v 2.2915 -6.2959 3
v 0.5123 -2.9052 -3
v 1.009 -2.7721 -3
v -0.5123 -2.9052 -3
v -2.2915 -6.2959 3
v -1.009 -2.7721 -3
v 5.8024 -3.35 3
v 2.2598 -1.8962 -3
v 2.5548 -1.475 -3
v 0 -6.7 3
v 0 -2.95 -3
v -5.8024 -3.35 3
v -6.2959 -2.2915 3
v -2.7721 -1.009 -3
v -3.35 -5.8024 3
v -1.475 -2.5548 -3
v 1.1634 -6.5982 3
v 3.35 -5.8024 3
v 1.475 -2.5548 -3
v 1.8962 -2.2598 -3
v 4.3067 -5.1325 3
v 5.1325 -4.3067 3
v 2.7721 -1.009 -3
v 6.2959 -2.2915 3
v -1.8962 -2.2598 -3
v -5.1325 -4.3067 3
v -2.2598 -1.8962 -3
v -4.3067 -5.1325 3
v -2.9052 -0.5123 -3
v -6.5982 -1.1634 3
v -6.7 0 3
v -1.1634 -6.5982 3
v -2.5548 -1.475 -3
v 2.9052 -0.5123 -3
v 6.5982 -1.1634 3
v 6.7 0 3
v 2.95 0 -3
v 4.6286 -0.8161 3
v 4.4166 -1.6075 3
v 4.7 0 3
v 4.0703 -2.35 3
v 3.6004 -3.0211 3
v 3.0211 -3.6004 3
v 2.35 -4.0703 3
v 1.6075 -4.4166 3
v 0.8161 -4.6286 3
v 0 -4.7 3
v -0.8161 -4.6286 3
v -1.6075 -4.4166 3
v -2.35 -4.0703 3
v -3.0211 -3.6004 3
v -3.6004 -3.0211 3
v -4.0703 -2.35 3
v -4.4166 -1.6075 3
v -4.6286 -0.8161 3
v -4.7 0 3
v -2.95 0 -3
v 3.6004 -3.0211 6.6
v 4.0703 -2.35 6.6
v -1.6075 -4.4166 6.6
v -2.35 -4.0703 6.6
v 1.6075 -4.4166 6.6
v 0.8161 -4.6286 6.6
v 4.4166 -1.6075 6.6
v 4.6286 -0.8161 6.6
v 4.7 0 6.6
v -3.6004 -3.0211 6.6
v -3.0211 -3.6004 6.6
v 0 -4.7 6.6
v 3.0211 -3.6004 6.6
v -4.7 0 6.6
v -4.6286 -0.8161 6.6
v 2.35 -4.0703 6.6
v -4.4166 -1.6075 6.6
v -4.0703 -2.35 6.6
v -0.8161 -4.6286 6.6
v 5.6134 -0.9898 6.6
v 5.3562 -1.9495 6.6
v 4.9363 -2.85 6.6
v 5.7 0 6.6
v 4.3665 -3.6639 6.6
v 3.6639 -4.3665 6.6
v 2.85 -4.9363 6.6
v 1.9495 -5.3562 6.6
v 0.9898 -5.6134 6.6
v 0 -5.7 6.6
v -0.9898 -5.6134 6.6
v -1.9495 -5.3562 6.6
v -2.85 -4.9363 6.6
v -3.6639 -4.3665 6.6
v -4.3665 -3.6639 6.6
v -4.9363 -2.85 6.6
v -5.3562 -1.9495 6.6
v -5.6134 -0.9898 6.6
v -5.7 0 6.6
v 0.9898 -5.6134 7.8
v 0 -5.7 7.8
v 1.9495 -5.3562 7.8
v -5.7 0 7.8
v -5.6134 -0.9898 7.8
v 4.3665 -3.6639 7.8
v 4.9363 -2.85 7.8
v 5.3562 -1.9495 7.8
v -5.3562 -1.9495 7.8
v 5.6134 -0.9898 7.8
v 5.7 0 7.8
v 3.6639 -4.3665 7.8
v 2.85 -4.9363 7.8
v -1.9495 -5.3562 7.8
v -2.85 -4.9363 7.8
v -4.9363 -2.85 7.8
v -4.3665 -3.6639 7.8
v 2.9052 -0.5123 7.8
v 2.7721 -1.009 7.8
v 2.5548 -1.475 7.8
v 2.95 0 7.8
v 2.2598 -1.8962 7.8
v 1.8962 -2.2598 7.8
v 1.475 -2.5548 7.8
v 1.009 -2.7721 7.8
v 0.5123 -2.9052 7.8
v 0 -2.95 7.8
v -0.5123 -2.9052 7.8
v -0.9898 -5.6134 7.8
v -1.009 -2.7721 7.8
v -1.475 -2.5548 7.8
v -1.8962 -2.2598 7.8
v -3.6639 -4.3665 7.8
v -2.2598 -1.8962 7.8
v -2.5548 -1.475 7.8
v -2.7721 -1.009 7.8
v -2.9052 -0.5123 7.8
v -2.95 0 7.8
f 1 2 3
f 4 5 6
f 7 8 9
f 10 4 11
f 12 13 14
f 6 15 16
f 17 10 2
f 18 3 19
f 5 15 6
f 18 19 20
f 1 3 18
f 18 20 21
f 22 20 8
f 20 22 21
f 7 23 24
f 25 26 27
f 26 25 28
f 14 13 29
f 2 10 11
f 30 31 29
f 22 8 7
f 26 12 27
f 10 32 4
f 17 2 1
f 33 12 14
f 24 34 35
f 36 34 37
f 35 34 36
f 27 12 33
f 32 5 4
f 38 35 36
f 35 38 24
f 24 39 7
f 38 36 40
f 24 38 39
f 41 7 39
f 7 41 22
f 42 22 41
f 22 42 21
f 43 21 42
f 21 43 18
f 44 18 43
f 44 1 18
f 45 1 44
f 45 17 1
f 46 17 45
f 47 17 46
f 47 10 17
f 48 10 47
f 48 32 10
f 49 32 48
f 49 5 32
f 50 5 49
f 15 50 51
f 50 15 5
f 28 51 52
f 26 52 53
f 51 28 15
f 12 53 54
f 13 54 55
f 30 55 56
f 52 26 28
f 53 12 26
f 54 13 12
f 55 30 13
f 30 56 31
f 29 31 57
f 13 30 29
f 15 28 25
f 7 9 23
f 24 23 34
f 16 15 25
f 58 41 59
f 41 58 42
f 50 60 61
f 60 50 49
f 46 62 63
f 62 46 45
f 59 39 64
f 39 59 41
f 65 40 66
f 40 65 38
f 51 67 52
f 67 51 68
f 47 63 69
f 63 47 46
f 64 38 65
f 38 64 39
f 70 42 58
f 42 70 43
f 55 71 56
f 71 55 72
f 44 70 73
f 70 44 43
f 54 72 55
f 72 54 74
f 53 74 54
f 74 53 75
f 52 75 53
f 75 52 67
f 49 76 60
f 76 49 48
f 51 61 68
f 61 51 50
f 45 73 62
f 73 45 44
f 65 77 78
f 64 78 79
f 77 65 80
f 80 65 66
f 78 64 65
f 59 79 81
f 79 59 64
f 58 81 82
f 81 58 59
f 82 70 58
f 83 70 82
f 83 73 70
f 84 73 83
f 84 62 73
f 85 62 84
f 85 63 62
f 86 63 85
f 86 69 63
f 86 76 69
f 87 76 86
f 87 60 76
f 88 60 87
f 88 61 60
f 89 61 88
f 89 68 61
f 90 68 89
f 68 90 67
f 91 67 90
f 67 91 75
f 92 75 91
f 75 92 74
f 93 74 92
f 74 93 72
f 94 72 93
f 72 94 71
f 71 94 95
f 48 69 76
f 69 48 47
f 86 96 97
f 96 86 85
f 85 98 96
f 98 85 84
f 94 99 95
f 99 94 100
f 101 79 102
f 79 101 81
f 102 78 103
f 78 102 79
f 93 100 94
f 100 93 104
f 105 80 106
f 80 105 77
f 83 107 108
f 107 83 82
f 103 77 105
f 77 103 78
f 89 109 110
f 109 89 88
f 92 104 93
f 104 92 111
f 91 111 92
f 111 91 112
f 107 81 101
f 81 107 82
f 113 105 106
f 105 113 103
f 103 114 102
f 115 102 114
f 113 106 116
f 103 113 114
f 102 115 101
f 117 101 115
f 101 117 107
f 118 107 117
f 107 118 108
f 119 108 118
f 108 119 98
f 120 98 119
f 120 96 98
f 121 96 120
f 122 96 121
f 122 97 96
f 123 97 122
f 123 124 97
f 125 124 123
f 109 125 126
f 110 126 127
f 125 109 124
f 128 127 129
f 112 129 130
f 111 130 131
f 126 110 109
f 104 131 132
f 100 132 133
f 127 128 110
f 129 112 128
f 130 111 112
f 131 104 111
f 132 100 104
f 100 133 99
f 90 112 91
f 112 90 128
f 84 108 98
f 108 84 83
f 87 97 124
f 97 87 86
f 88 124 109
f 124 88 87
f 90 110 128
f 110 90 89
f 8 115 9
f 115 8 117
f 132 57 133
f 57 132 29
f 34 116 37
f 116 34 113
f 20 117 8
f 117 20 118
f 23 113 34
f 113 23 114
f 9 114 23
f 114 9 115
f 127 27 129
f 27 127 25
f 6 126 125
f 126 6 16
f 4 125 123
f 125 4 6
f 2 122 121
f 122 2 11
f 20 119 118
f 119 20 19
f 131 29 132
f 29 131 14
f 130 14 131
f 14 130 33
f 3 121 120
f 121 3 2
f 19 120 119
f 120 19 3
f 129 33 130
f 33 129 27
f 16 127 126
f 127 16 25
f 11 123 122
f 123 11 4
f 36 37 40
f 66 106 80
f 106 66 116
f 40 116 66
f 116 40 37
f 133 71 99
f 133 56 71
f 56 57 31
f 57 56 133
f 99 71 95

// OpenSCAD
$fn=36;
//$cable and $hood are radii
$cable=5.9/2;
$hood=9.4/2;
$hooddepth=3.6;


module plug()
{
	difference()
	{
		plugsolid();
		cylinder(h=25, r=$cable,center=true);
	}
}

module plugsolid()
{
	cylinder(h=6, r1=$cable,r2=$hood+2,center=true);
	translate([0,0,3+$hooddepth/2])
		cylinder(h=$hooddepth, r=$hood,center=true);
	translate([0,0,3+$hooddepth+1.2/2])
		cylinder(h=1.2, r=$hood+1,center=true);
}

module plughalved()
{
	difference()
	{
		plug();
		translate([-15,0,-10])
			cube([30,10,30]);
	}
}

plughalved();
